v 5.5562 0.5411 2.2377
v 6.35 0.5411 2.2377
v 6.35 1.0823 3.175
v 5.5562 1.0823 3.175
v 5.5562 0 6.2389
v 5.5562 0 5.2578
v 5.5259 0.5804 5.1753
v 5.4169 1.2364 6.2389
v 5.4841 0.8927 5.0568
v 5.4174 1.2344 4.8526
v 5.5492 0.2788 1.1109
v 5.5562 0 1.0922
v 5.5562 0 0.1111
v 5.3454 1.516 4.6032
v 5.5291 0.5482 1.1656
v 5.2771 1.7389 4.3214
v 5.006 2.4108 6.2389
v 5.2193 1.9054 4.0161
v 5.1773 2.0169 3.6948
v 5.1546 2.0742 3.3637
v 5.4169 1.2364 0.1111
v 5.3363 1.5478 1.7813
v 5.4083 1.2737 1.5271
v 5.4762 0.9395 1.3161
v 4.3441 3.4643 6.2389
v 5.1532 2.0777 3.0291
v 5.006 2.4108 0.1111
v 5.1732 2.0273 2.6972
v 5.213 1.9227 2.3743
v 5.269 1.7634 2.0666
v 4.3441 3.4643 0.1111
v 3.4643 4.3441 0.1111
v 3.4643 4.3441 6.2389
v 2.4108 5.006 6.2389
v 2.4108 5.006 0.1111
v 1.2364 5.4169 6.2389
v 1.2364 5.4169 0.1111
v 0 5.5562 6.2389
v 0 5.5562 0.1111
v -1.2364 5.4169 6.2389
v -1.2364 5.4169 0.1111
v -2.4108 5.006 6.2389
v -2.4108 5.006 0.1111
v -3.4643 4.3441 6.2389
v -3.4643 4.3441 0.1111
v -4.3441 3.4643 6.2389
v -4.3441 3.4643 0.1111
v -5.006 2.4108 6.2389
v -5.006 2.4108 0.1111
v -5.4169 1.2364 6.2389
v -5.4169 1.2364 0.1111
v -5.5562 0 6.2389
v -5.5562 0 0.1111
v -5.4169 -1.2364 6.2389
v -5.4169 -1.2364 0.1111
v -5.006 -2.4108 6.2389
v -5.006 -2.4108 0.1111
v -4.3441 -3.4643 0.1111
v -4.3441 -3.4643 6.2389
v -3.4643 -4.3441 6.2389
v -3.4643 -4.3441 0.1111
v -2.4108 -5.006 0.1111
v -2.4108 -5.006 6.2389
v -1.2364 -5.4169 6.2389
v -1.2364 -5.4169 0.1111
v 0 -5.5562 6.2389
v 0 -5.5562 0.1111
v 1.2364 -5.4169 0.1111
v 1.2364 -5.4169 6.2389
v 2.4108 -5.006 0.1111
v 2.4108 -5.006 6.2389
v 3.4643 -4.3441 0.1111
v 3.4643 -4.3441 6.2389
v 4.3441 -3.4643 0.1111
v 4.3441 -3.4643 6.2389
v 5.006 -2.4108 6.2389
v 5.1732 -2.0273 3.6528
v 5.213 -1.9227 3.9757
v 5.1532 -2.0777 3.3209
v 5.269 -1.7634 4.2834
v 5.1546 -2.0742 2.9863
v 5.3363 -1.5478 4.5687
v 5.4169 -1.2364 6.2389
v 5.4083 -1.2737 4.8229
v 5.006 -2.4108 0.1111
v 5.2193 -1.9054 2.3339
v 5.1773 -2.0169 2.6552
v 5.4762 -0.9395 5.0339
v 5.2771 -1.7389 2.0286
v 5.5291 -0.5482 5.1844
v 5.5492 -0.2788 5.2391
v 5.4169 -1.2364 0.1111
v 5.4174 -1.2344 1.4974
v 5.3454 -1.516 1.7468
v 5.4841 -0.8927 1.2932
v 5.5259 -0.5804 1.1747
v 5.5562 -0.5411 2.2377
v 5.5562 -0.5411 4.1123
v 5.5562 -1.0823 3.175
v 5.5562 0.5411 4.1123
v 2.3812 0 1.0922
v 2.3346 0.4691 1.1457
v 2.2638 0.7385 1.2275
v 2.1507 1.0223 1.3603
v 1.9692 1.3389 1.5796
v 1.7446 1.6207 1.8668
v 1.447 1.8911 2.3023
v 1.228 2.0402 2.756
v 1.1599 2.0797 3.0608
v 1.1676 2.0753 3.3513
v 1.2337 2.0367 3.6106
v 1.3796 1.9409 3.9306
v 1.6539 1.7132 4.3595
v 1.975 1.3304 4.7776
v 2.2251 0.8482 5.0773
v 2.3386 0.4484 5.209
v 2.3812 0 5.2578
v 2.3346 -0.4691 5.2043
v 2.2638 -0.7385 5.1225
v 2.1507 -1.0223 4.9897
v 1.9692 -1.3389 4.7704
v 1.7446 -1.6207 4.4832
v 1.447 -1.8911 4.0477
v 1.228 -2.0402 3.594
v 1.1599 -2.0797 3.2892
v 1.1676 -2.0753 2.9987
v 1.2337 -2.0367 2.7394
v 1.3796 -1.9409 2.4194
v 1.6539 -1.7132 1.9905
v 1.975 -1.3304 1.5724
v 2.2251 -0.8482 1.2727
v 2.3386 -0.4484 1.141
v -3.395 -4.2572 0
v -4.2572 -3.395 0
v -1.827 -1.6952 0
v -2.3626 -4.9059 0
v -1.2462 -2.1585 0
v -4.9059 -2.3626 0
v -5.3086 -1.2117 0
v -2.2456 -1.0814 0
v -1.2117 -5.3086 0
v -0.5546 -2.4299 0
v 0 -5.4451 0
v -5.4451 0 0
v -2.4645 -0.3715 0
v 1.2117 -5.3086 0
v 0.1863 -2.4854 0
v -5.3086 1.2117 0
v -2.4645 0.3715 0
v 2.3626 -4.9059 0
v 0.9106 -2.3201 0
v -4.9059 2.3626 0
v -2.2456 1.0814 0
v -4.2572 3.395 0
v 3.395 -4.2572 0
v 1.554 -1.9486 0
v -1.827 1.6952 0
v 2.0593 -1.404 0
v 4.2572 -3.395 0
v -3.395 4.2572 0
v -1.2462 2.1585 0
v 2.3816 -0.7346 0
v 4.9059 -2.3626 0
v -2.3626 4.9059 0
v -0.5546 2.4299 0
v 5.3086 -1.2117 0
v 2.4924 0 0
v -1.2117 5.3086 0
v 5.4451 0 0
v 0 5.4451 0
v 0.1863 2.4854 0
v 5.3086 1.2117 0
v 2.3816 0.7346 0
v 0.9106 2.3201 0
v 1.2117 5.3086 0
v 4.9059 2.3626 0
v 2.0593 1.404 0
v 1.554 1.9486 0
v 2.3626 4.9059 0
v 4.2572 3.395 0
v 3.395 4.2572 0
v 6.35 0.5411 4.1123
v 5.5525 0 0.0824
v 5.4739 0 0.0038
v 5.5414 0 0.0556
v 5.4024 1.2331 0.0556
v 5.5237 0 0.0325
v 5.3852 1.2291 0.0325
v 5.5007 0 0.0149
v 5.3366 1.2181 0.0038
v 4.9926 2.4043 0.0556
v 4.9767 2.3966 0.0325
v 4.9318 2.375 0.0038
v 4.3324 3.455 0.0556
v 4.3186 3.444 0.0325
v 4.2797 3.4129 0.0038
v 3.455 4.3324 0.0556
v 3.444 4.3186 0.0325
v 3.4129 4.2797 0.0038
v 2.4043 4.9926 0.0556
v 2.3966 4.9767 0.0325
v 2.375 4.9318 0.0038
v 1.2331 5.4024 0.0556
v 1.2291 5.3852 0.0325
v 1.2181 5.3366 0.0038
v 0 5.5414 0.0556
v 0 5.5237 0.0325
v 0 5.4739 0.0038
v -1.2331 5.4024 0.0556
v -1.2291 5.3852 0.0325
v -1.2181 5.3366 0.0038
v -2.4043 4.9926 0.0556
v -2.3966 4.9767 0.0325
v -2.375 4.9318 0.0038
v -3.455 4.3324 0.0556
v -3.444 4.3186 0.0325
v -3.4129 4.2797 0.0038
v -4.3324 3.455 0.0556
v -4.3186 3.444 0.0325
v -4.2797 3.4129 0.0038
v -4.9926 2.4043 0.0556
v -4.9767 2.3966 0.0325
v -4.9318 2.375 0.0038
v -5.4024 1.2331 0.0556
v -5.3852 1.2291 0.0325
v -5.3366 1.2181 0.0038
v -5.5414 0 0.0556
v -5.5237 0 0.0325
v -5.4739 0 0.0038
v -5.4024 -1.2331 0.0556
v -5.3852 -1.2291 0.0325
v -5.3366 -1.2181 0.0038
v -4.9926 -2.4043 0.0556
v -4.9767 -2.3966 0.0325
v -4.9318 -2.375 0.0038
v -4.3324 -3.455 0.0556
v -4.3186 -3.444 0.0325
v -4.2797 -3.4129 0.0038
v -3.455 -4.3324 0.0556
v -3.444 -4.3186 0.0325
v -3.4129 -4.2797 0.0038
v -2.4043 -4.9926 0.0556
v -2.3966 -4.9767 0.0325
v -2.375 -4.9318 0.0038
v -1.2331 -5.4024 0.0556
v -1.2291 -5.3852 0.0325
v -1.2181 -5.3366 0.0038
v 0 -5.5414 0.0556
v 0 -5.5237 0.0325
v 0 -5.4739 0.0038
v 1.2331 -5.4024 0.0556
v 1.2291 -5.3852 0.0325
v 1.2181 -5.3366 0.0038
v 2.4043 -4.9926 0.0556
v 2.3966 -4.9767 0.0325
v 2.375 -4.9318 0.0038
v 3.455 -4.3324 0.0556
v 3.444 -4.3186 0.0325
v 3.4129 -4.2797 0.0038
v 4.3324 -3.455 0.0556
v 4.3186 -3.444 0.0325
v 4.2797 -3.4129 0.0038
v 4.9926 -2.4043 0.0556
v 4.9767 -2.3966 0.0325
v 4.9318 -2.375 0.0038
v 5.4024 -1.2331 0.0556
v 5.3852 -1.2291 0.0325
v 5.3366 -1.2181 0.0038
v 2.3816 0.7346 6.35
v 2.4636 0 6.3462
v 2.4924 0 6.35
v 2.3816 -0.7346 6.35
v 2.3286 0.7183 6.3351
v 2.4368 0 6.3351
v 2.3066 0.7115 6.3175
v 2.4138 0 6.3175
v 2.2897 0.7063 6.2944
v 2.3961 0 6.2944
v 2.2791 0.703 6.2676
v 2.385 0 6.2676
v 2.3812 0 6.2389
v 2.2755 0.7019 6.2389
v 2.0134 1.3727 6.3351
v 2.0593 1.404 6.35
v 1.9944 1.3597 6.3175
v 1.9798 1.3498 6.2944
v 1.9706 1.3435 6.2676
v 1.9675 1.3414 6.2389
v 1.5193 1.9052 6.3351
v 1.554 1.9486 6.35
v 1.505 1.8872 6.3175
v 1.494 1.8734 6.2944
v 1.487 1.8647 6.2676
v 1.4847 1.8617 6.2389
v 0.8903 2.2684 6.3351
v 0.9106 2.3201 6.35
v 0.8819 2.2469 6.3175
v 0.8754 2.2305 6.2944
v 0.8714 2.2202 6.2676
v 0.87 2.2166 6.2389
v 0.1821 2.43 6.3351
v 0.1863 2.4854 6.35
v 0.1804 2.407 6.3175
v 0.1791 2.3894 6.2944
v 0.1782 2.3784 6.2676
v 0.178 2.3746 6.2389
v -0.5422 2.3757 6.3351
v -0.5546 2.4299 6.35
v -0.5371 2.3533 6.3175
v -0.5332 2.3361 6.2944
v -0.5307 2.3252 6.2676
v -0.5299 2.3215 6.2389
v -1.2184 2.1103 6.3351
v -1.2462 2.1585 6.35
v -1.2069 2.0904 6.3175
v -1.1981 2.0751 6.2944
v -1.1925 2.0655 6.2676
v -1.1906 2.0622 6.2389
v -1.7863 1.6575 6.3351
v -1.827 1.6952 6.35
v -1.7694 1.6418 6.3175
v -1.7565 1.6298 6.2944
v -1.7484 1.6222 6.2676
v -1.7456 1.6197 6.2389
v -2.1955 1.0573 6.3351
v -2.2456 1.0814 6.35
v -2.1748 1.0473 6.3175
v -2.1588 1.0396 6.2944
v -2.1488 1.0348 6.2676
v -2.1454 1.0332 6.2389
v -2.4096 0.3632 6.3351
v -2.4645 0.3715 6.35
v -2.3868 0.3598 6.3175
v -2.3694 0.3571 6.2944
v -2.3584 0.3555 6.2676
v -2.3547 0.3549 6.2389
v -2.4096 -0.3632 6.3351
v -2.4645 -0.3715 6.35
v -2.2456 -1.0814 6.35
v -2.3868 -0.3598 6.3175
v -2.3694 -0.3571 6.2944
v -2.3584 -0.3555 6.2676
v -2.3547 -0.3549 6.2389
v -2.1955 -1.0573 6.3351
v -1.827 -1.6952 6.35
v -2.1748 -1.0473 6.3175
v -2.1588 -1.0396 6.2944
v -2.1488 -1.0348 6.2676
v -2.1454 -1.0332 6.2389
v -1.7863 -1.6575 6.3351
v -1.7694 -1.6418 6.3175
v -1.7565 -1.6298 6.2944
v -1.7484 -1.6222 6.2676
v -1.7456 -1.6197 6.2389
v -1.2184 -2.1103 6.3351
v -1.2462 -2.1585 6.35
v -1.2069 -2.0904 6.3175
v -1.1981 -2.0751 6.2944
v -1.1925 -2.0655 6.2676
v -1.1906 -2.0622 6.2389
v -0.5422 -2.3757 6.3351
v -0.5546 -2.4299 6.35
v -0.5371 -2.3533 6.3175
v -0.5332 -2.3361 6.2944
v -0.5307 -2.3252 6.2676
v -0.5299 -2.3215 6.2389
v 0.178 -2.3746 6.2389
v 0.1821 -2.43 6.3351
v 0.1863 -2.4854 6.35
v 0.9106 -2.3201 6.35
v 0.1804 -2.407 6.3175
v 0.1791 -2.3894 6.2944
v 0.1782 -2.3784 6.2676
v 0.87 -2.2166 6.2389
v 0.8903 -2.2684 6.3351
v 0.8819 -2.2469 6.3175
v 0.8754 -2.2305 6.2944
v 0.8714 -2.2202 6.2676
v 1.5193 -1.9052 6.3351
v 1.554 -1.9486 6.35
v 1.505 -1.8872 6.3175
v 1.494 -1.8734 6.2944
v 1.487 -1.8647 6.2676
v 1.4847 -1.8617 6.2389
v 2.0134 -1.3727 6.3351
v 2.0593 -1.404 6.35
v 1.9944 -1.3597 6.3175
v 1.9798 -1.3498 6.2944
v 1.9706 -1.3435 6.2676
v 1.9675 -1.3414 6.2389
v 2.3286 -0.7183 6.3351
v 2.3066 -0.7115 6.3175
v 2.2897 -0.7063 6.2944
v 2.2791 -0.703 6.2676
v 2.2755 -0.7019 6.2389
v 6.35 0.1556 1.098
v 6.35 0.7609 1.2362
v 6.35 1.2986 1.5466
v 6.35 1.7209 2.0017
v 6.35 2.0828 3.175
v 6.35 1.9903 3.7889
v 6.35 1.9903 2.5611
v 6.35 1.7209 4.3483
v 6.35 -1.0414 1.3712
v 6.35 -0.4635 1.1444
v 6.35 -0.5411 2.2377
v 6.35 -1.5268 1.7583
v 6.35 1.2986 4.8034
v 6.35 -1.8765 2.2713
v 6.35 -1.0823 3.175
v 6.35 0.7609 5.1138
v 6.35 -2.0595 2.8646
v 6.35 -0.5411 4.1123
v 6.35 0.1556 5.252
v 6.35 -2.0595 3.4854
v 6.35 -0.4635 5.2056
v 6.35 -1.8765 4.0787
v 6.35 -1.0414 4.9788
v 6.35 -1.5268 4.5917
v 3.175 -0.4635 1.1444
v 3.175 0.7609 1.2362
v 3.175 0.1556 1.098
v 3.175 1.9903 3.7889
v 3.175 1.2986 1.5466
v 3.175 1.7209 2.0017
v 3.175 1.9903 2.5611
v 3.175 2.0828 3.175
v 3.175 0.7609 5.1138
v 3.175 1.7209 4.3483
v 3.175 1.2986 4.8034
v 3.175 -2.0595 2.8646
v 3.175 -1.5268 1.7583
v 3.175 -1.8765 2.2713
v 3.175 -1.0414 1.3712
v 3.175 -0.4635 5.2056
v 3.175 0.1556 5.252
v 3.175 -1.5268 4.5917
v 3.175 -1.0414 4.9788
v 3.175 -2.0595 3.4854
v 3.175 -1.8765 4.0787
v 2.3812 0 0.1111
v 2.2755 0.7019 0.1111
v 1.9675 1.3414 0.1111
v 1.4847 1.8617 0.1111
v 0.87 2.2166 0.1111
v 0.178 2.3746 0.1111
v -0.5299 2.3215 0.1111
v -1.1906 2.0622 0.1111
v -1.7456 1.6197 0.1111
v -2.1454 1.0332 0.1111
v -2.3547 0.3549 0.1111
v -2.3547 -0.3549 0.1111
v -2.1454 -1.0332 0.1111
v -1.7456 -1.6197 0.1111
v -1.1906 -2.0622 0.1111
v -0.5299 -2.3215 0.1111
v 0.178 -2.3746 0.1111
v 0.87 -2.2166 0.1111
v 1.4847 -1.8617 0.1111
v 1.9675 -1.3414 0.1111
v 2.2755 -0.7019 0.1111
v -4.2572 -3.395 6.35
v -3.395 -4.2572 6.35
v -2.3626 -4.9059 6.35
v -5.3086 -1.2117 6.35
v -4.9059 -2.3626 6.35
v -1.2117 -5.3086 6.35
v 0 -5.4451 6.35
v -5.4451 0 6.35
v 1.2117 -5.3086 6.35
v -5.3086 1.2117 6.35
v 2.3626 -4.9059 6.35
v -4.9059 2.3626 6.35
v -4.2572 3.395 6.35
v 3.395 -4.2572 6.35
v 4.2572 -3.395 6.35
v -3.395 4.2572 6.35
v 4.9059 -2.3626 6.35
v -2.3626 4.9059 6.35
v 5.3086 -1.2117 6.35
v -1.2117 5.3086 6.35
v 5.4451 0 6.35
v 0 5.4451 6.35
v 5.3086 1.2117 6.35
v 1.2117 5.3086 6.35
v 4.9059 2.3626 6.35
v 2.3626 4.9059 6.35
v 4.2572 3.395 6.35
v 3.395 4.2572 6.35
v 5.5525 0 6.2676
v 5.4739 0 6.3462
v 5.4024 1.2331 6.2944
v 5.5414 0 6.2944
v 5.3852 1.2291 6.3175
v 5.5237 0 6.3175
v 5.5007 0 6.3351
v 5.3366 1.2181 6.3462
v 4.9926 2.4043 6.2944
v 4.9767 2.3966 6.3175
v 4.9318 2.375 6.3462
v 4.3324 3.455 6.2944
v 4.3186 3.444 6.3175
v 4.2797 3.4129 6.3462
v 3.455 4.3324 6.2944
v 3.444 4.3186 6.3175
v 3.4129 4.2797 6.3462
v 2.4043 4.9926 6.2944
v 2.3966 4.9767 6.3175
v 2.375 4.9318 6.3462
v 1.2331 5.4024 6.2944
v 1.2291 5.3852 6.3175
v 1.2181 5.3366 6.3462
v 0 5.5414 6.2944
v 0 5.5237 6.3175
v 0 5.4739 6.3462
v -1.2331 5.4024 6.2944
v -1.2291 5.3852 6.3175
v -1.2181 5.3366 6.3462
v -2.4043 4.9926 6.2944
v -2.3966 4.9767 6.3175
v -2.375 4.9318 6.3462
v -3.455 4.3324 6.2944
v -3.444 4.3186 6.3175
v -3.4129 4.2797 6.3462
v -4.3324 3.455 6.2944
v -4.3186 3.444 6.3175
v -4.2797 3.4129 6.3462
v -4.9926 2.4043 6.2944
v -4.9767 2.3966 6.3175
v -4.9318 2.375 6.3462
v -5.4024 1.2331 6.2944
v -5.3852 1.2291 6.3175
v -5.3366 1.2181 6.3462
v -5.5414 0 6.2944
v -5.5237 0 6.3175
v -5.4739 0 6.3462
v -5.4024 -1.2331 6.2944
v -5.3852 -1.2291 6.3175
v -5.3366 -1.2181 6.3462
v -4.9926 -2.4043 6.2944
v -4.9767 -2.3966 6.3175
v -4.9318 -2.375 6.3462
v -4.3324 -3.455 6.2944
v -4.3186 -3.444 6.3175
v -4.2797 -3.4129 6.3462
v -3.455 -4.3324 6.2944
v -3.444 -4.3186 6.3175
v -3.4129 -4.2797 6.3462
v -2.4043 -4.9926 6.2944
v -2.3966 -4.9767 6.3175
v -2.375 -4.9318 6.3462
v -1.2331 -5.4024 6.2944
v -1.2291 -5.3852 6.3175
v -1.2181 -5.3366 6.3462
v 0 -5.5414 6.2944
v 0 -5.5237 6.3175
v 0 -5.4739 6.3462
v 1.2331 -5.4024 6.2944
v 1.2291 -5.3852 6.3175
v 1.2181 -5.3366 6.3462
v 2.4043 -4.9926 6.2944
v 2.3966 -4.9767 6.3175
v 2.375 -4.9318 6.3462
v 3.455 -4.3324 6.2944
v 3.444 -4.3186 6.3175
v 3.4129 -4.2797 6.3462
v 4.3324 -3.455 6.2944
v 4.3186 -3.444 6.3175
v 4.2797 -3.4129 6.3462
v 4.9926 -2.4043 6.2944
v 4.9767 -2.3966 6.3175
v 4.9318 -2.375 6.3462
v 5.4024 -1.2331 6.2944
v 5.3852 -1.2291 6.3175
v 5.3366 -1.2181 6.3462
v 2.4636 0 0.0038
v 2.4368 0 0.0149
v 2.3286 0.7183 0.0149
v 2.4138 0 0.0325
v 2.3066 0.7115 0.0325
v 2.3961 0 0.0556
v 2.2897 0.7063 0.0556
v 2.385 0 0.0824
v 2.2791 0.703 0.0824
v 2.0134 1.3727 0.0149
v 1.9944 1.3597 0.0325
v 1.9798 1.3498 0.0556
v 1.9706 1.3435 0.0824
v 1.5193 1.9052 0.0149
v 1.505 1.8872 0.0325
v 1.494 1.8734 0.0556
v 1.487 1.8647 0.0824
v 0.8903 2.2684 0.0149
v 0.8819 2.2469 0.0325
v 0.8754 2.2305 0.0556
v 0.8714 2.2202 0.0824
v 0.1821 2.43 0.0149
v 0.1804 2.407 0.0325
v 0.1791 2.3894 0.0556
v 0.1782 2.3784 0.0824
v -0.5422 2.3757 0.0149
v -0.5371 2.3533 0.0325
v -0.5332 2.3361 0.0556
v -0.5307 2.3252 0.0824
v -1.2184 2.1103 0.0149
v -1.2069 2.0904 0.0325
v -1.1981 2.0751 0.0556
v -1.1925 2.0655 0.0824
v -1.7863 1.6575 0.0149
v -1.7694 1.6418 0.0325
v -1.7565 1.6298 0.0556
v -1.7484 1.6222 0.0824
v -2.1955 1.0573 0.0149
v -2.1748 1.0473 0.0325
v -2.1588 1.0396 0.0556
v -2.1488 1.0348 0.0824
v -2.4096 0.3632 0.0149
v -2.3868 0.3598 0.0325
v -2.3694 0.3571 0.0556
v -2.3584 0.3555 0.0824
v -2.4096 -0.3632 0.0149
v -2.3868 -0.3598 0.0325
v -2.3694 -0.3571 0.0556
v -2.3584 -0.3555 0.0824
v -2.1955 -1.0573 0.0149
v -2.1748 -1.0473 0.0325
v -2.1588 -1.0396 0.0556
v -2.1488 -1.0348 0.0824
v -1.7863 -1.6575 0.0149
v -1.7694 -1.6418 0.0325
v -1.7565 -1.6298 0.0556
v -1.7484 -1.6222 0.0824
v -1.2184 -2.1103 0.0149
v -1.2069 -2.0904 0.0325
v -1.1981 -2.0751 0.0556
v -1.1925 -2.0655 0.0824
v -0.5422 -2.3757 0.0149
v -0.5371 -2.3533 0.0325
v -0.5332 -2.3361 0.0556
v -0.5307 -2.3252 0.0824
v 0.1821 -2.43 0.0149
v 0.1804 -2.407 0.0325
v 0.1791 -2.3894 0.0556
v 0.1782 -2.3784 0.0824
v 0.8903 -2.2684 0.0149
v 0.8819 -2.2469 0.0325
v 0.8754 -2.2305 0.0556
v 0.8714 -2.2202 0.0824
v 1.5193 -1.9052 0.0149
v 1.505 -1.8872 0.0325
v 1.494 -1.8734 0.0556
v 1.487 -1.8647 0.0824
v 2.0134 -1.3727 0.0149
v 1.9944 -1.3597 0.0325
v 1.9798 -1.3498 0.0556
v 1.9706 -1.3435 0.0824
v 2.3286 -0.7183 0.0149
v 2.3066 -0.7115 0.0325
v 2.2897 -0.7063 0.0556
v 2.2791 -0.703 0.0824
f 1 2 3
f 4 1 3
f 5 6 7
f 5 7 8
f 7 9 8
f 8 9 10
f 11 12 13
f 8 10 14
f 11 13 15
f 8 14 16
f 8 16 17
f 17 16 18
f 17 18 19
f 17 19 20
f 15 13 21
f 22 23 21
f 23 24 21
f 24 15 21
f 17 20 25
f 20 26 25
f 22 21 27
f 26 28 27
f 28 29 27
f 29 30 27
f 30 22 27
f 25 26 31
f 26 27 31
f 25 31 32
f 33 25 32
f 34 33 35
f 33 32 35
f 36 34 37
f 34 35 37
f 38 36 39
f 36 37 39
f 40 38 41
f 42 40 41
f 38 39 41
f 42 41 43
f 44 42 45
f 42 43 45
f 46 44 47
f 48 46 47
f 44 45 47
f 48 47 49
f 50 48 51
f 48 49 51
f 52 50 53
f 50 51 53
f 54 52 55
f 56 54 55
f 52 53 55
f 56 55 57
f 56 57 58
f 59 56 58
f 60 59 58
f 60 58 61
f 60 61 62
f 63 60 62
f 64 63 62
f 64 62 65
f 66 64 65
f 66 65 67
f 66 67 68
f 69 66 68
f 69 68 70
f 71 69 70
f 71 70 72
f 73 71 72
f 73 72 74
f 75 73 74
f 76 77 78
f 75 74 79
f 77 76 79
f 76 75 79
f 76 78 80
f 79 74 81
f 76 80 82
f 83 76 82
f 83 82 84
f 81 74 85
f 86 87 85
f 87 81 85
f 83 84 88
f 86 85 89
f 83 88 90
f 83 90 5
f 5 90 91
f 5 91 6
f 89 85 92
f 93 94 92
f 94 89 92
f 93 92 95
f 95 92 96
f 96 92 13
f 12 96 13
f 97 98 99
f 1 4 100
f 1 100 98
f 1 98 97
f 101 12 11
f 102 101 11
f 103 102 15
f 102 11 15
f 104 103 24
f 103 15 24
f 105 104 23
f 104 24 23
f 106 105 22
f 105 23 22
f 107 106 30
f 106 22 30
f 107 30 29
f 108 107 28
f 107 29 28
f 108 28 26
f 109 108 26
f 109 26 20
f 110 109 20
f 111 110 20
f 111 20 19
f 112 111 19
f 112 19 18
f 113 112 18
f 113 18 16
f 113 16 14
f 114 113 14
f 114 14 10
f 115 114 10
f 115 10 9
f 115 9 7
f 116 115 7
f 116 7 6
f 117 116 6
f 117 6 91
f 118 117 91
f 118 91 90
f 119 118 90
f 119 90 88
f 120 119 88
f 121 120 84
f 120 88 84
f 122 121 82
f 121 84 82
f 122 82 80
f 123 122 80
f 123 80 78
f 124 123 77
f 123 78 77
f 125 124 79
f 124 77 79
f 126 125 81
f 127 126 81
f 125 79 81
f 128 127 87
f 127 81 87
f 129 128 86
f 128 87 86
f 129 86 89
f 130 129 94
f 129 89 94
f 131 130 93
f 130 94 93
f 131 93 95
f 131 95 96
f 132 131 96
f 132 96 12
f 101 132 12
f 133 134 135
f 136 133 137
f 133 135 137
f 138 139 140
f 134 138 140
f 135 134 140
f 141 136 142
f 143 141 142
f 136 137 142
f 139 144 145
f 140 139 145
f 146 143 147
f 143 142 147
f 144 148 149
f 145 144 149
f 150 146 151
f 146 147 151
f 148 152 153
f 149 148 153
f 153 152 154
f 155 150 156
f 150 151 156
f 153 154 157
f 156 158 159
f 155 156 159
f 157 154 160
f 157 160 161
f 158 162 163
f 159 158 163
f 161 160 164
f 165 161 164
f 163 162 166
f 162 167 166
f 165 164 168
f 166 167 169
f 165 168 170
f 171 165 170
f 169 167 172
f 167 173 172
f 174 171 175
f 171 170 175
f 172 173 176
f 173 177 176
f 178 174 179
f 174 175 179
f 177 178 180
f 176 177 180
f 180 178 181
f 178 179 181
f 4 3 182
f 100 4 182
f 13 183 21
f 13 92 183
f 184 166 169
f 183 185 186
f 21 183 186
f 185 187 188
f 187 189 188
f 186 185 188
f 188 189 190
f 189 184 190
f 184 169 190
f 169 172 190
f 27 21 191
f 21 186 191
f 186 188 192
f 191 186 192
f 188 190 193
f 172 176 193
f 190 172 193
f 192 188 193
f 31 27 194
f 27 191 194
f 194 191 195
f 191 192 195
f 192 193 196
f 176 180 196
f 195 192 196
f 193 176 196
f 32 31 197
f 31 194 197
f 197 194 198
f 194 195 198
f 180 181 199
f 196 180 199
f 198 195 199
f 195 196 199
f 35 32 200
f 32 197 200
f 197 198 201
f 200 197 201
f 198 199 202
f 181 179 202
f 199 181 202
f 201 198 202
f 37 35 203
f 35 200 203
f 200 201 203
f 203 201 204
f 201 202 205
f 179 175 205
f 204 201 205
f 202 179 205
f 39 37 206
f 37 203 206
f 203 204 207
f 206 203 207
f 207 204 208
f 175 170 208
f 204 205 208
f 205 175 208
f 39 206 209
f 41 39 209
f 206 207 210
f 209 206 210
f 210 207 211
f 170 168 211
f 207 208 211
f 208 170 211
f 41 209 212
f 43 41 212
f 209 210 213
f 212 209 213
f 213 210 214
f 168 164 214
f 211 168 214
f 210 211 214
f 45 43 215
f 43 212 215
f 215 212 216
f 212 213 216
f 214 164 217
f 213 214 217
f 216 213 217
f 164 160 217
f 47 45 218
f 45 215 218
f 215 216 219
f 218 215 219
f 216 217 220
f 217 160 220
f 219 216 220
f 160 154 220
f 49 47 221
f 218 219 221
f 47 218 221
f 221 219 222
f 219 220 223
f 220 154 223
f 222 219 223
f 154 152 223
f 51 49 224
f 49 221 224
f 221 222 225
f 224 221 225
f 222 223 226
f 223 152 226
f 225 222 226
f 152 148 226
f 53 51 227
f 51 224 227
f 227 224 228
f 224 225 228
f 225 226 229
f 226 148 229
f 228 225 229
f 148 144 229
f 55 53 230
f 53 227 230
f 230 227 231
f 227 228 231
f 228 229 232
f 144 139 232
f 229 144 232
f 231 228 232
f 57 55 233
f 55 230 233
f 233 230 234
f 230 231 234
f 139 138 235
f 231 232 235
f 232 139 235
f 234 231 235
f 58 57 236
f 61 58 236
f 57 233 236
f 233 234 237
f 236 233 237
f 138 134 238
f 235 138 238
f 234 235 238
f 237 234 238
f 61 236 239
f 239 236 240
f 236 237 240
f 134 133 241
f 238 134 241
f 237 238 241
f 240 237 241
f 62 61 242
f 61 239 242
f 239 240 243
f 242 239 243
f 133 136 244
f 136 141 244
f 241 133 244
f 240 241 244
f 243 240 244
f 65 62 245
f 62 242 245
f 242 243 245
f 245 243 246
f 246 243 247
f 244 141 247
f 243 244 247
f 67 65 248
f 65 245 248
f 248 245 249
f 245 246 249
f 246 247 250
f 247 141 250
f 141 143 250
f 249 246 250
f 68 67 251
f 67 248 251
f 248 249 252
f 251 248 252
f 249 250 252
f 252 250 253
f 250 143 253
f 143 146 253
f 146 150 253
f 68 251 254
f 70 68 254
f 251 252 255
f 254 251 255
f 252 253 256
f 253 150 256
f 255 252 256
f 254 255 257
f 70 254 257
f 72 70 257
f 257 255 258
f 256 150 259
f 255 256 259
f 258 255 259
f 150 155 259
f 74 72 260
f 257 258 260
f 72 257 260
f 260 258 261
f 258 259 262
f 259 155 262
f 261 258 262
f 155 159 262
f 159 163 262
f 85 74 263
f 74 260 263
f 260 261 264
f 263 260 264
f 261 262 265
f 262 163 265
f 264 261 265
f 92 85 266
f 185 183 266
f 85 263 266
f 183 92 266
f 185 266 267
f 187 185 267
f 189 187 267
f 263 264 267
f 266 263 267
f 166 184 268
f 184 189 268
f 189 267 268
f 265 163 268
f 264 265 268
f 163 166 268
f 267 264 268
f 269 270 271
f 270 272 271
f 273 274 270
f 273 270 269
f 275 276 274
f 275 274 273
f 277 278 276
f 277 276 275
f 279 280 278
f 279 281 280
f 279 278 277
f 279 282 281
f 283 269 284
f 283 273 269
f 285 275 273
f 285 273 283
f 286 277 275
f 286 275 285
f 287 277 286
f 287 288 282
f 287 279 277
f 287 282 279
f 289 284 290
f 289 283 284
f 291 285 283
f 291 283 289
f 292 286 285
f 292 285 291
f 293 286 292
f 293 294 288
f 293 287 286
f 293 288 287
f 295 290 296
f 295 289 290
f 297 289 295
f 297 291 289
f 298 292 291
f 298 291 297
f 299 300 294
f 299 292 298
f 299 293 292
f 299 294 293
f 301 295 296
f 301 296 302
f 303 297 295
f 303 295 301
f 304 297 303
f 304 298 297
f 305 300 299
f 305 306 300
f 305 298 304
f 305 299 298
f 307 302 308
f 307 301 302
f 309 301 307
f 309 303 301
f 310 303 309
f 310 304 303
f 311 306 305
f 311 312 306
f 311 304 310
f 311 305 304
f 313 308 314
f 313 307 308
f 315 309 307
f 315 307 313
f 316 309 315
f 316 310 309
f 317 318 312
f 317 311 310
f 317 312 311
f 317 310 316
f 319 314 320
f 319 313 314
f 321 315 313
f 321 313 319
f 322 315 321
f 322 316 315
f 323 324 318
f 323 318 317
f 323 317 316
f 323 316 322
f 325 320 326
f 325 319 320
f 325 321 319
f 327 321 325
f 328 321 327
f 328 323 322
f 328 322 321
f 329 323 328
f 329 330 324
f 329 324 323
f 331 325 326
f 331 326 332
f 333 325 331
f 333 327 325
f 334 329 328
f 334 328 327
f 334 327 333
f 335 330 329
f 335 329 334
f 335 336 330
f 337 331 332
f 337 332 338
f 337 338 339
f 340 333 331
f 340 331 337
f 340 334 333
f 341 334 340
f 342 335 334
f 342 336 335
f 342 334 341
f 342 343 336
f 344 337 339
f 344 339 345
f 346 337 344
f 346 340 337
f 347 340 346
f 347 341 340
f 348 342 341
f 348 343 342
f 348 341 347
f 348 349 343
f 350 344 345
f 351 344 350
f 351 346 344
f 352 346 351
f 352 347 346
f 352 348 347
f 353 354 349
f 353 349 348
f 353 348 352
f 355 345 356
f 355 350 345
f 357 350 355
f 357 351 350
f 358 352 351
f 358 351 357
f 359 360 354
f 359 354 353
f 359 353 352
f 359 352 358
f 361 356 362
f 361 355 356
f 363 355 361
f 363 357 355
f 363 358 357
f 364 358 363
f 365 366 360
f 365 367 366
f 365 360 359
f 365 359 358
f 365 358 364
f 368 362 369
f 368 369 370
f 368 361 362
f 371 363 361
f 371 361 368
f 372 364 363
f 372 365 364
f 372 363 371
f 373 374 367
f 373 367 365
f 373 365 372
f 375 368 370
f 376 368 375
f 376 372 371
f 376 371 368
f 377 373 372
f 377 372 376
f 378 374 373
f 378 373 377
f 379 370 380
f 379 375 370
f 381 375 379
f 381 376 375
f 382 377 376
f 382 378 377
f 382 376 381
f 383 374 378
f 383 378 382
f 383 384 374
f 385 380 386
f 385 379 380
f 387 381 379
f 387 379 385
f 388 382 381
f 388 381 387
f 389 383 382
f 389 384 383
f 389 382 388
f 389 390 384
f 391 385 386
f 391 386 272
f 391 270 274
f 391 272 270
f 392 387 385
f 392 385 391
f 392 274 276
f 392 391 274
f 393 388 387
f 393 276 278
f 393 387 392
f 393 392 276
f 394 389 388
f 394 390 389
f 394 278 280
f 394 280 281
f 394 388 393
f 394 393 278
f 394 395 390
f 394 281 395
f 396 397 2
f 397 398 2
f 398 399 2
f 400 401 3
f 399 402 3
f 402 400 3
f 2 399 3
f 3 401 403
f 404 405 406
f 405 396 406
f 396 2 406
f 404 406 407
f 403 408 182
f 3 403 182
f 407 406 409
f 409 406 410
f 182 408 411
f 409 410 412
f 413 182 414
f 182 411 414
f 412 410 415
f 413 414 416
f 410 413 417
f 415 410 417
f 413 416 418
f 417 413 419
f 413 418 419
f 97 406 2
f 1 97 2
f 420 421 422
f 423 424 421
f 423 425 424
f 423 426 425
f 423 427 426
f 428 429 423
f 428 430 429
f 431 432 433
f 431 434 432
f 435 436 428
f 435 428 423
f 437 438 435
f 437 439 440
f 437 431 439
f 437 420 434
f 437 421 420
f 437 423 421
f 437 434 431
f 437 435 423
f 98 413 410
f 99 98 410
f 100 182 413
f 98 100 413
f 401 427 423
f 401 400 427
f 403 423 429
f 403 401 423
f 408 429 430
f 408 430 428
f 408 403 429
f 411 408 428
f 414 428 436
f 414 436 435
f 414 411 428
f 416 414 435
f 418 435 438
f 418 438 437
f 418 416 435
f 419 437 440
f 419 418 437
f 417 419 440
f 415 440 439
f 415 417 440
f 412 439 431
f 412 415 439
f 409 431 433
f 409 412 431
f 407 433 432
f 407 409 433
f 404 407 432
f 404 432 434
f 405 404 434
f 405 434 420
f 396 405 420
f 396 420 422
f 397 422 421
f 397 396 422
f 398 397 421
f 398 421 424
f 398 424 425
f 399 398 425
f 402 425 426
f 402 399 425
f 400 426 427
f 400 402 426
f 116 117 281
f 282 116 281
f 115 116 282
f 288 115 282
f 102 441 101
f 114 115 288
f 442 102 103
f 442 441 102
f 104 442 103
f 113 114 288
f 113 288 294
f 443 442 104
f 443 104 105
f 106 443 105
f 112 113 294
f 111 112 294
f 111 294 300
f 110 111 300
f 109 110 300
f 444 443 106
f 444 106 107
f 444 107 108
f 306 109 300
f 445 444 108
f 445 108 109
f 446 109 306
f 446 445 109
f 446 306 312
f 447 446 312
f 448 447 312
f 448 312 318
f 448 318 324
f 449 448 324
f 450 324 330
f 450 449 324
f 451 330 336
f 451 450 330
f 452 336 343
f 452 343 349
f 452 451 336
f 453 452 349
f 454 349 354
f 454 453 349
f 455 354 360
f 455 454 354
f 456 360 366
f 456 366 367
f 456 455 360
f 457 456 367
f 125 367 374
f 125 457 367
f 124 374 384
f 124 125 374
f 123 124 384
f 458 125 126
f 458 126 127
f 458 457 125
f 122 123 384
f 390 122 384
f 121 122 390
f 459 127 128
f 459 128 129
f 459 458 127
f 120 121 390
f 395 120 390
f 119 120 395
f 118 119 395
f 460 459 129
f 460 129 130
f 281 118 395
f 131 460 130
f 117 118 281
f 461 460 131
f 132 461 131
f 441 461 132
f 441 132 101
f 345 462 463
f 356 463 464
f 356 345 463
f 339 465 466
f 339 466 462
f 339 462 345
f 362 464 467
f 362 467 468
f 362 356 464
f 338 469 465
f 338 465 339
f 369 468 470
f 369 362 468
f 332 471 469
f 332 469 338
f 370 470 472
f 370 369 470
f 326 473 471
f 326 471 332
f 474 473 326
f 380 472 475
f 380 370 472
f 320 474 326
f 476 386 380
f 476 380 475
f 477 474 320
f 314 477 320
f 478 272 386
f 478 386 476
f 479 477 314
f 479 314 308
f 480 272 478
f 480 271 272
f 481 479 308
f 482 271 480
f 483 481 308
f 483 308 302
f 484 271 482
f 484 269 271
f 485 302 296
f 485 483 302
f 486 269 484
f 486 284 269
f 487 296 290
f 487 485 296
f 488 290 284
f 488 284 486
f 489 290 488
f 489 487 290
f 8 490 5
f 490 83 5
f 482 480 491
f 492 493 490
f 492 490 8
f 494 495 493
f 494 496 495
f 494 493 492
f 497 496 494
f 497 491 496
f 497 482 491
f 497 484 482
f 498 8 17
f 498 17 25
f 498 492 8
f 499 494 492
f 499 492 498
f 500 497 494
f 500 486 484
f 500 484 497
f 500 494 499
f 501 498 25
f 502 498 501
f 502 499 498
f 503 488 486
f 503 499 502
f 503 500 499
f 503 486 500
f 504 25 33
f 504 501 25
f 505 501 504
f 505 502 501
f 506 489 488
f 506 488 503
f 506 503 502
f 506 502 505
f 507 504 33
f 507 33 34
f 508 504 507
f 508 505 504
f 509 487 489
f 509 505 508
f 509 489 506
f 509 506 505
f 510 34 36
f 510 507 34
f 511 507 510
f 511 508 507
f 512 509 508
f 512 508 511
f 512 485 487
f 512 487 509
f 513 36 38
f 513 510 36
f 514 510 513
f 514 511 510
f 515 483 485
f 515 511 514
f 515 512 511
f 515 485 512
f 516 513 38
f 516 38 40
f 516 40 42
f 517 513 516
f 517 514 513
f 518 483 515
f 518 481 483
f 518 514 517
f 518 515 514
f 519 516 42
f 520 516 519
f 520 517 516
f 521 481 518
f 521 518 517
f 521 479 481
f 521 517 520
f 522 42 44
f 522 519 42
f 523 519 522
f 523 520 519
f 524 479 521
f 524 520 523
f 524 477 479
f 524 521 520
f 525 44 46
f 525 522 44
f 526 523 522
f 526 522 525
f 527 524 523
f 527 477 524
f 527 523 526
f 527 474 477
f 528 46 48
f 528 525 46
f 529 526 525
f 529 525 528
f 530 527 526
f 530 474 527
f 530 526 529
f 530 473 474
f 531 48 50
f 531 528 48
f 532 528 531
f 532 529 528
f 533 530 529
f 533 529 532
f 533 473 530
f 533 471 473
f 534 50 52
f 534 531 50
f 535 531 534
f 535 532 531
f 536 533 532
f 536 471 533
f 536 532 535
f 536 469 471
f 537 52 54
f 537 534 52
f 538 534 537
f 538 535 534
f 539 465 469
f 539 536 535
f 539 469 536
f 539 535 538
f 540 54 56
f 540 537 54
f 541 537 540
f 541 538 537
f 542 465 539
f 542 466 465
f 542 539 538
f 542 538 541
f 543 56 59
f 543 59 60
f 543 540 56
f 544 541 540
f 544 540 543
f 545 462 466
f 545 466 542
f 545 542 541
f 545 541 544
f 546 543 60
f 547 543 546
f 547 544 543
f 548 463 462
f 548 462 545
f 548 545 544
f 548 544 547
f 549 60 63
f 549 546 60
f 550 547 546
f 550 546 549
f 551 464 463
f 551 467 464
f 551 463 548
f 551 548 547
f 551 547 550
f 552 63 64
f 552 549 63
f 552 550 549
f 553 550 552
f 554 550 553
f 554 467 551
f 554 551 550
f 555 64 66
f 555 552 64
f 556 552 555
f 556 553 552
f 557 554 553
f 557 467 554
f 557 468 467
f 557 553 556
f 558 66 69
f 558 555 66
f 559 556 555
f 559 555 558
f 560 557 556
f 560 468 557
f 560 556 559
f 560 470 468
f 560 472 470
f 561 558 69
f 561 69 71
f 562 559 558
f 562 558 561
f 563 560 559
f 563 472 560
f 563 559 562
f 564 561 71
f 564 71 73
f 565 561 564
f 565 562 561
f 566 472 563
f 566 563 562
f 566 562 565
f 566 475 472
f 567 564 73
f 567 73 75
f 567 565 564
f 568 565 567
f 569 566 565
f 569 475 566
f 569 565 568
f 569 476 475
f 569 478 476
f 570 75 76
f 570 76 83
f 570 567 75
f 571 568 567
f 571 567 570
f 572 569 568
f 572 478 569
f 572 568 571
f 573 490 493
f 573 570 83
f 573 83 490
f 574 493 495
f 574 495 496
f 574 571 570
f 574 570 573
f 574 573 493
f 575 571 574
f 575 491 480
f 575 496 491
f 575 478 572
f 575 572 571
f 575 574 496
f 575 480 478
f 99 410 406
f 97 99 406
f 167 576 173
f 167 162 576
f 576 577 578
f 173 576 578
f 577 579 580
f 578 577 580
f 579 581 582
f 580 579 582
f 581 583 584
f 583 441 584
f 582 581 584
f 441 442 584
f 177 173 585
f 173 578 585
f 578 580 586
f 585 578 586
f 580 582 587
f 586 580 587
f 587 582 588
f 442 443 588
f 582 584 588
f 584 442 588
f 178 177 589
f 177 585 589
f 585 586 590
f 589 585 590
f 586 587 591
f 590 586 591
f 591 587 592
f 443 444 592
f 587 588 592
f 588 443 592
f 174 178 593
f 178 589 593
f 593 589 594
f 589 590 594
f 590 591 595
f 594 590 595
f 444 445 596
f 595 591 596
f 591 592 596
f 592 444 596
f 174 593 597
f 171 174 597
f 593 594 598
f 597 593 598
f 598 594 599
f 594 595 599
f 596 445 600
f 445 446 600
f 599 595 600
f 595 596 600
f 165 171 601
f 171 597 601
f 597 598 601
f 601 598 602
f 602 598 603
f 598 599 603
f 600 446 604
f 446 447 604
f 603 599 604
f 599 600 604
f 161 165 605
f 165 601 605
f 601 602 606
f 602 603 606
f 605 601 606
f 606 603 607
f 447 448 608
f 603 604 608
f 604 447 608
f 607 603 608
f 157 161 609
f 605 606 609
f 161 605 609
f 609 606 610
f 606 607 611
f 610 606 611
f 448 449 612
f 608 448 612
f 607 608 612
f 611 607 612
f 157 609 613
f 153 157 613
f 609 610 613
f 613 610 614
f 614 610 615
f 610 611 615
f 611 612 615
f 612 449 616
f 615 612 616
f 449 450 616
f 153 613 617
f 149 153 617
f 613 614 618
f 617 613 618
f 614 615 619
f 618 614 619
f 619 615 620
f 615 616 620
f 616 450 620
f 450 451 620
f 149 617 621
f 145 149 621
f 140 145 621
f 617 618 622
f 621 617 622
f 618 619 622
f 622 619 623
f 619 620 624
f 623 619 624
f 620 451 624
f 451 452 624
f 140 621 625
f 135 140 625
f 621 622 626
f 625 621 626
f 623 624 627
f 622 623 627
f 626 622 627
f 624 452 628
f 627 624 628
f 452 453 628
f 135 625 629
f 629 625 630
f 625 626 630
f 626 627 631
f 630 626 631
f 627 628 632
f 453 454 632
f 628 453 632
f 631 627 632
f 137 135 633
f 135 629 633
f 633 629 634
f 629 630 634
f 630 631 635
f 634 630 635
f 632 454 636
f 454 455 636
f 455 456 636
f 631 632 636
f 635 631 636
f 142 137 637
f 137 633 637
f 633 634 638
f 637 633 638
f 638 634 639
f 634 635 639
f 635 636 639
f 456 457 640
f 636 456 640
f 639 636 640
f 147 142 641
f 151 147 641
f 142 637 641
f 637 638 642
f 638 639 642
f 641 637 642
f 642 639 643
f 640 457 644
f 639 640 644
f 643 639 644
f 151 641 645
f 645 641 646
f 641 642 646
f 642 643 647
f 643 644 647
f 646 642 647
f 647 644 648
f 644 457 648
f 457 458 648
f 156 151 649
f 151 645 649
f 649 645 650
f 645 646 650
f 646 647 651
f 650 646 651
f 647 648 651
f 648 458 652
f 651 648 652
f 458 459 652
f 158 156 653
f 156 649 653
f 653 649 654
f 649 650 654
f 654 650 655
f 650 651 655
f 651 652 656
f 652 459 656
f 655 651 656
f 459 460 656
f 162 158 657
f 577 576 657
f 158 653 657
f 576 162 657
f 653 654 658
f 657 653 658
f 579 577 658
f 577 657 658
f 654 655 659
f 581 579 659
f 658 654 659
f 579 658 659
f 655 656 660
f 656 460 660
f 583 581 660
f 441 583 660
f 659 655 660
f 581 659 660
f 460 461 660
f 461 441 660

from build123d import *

# Parameters (mm, degrees)
SKETCH1_R          = 5.55625
SKETCH1_R_2        = 2.38125
EXTRUDE1_DEPTH     = 6.35
CUT_EXTRUDE1_REACH = 13.112
SKETCH2_R          = 2.0828
SKETCH3_W          = 3.175
SKETCH3_H          = 2.0828
CUT_EXTRUDE2_DEPTH = 0.79375
FILLET1_R          = 0.111125


with BuildPart() as part:
    # Sketch1 → Extrude1 (new body)
    with BuildSketch(Plane.XY):
        Circle(SKETCH1_R)
        Circle(SKETCH1_R_2, mode=Mode.SUBTRACT)
    extrude(amount=EXTRUDE1_DEPTH)

    # Sketch2 → Cut-Extrude1 (cut, up to next)
    with BuildSketch(Plane(origin=(5.55625, 0, 0), x_dir=(0, 0, -1), z_dir=(1, 0, 0)), mode=Mode.PRIVATE) as cut_extrude1_sk1:
        with Locations((-3.175, 0)):
            Circle(SKETCH2_R)
    cut_extrude1_tool1 = extrude(cut_extrude1_sk1.sketch, amount=-CUT_EXTRUDE1_REACH, mode=Mode.PRIVATE) & part.part
    add(cut_extrude1_tool1.solids().sort_by_distance((5.55625, 0, 3.175))[0], mode=Mode.SUBTRACT)

    # Fillet1
    fillet1_edges = [part.edges().sort_by_distance(p)[0] for p in [
        (-5.55625, 0, 0),
        (-5.55625, 0, 6.35),
        (-2.38125, 0, 0),
        (-2.38125, 0, 6.35),
    ]]
    fillet(fillet1_edges, radius=FILLET1_R)


with BuildPart() as body_2:
    # Sketch3 → Revolve1 (revolve)
    with BuildSketch(Plane.XY.offset(3.175)):
        with Locations((4.7625, 1.0414)):
            Rectangle(SKETCH3_W, SKETCH3_H)
    revolve(axis=Axis((3.175, 0, 3.175), (1, 0, 0)))

    # Sketch4 → Cut-Extrude2 (cut)
    with BuildSketch(Plane(origin=(6.35, 0, 0), x_dir=(0, 0, -1), z_dir=(1, 0, 0))):
        Polygon((-3.175, 1.082254627), (-4.11226, 0.541127313), (-4.11226, -0.541127313), (-3.175, -1.082254627), (-2.23774, -0.541127313), (-2.23774, 0.541127313), align=None)
    extrude(amount=-CUT_EXTRUDE2_DEPTH, mode=Mode.SUBTRACT)


solid = Compound([part.part, body_2.part])
